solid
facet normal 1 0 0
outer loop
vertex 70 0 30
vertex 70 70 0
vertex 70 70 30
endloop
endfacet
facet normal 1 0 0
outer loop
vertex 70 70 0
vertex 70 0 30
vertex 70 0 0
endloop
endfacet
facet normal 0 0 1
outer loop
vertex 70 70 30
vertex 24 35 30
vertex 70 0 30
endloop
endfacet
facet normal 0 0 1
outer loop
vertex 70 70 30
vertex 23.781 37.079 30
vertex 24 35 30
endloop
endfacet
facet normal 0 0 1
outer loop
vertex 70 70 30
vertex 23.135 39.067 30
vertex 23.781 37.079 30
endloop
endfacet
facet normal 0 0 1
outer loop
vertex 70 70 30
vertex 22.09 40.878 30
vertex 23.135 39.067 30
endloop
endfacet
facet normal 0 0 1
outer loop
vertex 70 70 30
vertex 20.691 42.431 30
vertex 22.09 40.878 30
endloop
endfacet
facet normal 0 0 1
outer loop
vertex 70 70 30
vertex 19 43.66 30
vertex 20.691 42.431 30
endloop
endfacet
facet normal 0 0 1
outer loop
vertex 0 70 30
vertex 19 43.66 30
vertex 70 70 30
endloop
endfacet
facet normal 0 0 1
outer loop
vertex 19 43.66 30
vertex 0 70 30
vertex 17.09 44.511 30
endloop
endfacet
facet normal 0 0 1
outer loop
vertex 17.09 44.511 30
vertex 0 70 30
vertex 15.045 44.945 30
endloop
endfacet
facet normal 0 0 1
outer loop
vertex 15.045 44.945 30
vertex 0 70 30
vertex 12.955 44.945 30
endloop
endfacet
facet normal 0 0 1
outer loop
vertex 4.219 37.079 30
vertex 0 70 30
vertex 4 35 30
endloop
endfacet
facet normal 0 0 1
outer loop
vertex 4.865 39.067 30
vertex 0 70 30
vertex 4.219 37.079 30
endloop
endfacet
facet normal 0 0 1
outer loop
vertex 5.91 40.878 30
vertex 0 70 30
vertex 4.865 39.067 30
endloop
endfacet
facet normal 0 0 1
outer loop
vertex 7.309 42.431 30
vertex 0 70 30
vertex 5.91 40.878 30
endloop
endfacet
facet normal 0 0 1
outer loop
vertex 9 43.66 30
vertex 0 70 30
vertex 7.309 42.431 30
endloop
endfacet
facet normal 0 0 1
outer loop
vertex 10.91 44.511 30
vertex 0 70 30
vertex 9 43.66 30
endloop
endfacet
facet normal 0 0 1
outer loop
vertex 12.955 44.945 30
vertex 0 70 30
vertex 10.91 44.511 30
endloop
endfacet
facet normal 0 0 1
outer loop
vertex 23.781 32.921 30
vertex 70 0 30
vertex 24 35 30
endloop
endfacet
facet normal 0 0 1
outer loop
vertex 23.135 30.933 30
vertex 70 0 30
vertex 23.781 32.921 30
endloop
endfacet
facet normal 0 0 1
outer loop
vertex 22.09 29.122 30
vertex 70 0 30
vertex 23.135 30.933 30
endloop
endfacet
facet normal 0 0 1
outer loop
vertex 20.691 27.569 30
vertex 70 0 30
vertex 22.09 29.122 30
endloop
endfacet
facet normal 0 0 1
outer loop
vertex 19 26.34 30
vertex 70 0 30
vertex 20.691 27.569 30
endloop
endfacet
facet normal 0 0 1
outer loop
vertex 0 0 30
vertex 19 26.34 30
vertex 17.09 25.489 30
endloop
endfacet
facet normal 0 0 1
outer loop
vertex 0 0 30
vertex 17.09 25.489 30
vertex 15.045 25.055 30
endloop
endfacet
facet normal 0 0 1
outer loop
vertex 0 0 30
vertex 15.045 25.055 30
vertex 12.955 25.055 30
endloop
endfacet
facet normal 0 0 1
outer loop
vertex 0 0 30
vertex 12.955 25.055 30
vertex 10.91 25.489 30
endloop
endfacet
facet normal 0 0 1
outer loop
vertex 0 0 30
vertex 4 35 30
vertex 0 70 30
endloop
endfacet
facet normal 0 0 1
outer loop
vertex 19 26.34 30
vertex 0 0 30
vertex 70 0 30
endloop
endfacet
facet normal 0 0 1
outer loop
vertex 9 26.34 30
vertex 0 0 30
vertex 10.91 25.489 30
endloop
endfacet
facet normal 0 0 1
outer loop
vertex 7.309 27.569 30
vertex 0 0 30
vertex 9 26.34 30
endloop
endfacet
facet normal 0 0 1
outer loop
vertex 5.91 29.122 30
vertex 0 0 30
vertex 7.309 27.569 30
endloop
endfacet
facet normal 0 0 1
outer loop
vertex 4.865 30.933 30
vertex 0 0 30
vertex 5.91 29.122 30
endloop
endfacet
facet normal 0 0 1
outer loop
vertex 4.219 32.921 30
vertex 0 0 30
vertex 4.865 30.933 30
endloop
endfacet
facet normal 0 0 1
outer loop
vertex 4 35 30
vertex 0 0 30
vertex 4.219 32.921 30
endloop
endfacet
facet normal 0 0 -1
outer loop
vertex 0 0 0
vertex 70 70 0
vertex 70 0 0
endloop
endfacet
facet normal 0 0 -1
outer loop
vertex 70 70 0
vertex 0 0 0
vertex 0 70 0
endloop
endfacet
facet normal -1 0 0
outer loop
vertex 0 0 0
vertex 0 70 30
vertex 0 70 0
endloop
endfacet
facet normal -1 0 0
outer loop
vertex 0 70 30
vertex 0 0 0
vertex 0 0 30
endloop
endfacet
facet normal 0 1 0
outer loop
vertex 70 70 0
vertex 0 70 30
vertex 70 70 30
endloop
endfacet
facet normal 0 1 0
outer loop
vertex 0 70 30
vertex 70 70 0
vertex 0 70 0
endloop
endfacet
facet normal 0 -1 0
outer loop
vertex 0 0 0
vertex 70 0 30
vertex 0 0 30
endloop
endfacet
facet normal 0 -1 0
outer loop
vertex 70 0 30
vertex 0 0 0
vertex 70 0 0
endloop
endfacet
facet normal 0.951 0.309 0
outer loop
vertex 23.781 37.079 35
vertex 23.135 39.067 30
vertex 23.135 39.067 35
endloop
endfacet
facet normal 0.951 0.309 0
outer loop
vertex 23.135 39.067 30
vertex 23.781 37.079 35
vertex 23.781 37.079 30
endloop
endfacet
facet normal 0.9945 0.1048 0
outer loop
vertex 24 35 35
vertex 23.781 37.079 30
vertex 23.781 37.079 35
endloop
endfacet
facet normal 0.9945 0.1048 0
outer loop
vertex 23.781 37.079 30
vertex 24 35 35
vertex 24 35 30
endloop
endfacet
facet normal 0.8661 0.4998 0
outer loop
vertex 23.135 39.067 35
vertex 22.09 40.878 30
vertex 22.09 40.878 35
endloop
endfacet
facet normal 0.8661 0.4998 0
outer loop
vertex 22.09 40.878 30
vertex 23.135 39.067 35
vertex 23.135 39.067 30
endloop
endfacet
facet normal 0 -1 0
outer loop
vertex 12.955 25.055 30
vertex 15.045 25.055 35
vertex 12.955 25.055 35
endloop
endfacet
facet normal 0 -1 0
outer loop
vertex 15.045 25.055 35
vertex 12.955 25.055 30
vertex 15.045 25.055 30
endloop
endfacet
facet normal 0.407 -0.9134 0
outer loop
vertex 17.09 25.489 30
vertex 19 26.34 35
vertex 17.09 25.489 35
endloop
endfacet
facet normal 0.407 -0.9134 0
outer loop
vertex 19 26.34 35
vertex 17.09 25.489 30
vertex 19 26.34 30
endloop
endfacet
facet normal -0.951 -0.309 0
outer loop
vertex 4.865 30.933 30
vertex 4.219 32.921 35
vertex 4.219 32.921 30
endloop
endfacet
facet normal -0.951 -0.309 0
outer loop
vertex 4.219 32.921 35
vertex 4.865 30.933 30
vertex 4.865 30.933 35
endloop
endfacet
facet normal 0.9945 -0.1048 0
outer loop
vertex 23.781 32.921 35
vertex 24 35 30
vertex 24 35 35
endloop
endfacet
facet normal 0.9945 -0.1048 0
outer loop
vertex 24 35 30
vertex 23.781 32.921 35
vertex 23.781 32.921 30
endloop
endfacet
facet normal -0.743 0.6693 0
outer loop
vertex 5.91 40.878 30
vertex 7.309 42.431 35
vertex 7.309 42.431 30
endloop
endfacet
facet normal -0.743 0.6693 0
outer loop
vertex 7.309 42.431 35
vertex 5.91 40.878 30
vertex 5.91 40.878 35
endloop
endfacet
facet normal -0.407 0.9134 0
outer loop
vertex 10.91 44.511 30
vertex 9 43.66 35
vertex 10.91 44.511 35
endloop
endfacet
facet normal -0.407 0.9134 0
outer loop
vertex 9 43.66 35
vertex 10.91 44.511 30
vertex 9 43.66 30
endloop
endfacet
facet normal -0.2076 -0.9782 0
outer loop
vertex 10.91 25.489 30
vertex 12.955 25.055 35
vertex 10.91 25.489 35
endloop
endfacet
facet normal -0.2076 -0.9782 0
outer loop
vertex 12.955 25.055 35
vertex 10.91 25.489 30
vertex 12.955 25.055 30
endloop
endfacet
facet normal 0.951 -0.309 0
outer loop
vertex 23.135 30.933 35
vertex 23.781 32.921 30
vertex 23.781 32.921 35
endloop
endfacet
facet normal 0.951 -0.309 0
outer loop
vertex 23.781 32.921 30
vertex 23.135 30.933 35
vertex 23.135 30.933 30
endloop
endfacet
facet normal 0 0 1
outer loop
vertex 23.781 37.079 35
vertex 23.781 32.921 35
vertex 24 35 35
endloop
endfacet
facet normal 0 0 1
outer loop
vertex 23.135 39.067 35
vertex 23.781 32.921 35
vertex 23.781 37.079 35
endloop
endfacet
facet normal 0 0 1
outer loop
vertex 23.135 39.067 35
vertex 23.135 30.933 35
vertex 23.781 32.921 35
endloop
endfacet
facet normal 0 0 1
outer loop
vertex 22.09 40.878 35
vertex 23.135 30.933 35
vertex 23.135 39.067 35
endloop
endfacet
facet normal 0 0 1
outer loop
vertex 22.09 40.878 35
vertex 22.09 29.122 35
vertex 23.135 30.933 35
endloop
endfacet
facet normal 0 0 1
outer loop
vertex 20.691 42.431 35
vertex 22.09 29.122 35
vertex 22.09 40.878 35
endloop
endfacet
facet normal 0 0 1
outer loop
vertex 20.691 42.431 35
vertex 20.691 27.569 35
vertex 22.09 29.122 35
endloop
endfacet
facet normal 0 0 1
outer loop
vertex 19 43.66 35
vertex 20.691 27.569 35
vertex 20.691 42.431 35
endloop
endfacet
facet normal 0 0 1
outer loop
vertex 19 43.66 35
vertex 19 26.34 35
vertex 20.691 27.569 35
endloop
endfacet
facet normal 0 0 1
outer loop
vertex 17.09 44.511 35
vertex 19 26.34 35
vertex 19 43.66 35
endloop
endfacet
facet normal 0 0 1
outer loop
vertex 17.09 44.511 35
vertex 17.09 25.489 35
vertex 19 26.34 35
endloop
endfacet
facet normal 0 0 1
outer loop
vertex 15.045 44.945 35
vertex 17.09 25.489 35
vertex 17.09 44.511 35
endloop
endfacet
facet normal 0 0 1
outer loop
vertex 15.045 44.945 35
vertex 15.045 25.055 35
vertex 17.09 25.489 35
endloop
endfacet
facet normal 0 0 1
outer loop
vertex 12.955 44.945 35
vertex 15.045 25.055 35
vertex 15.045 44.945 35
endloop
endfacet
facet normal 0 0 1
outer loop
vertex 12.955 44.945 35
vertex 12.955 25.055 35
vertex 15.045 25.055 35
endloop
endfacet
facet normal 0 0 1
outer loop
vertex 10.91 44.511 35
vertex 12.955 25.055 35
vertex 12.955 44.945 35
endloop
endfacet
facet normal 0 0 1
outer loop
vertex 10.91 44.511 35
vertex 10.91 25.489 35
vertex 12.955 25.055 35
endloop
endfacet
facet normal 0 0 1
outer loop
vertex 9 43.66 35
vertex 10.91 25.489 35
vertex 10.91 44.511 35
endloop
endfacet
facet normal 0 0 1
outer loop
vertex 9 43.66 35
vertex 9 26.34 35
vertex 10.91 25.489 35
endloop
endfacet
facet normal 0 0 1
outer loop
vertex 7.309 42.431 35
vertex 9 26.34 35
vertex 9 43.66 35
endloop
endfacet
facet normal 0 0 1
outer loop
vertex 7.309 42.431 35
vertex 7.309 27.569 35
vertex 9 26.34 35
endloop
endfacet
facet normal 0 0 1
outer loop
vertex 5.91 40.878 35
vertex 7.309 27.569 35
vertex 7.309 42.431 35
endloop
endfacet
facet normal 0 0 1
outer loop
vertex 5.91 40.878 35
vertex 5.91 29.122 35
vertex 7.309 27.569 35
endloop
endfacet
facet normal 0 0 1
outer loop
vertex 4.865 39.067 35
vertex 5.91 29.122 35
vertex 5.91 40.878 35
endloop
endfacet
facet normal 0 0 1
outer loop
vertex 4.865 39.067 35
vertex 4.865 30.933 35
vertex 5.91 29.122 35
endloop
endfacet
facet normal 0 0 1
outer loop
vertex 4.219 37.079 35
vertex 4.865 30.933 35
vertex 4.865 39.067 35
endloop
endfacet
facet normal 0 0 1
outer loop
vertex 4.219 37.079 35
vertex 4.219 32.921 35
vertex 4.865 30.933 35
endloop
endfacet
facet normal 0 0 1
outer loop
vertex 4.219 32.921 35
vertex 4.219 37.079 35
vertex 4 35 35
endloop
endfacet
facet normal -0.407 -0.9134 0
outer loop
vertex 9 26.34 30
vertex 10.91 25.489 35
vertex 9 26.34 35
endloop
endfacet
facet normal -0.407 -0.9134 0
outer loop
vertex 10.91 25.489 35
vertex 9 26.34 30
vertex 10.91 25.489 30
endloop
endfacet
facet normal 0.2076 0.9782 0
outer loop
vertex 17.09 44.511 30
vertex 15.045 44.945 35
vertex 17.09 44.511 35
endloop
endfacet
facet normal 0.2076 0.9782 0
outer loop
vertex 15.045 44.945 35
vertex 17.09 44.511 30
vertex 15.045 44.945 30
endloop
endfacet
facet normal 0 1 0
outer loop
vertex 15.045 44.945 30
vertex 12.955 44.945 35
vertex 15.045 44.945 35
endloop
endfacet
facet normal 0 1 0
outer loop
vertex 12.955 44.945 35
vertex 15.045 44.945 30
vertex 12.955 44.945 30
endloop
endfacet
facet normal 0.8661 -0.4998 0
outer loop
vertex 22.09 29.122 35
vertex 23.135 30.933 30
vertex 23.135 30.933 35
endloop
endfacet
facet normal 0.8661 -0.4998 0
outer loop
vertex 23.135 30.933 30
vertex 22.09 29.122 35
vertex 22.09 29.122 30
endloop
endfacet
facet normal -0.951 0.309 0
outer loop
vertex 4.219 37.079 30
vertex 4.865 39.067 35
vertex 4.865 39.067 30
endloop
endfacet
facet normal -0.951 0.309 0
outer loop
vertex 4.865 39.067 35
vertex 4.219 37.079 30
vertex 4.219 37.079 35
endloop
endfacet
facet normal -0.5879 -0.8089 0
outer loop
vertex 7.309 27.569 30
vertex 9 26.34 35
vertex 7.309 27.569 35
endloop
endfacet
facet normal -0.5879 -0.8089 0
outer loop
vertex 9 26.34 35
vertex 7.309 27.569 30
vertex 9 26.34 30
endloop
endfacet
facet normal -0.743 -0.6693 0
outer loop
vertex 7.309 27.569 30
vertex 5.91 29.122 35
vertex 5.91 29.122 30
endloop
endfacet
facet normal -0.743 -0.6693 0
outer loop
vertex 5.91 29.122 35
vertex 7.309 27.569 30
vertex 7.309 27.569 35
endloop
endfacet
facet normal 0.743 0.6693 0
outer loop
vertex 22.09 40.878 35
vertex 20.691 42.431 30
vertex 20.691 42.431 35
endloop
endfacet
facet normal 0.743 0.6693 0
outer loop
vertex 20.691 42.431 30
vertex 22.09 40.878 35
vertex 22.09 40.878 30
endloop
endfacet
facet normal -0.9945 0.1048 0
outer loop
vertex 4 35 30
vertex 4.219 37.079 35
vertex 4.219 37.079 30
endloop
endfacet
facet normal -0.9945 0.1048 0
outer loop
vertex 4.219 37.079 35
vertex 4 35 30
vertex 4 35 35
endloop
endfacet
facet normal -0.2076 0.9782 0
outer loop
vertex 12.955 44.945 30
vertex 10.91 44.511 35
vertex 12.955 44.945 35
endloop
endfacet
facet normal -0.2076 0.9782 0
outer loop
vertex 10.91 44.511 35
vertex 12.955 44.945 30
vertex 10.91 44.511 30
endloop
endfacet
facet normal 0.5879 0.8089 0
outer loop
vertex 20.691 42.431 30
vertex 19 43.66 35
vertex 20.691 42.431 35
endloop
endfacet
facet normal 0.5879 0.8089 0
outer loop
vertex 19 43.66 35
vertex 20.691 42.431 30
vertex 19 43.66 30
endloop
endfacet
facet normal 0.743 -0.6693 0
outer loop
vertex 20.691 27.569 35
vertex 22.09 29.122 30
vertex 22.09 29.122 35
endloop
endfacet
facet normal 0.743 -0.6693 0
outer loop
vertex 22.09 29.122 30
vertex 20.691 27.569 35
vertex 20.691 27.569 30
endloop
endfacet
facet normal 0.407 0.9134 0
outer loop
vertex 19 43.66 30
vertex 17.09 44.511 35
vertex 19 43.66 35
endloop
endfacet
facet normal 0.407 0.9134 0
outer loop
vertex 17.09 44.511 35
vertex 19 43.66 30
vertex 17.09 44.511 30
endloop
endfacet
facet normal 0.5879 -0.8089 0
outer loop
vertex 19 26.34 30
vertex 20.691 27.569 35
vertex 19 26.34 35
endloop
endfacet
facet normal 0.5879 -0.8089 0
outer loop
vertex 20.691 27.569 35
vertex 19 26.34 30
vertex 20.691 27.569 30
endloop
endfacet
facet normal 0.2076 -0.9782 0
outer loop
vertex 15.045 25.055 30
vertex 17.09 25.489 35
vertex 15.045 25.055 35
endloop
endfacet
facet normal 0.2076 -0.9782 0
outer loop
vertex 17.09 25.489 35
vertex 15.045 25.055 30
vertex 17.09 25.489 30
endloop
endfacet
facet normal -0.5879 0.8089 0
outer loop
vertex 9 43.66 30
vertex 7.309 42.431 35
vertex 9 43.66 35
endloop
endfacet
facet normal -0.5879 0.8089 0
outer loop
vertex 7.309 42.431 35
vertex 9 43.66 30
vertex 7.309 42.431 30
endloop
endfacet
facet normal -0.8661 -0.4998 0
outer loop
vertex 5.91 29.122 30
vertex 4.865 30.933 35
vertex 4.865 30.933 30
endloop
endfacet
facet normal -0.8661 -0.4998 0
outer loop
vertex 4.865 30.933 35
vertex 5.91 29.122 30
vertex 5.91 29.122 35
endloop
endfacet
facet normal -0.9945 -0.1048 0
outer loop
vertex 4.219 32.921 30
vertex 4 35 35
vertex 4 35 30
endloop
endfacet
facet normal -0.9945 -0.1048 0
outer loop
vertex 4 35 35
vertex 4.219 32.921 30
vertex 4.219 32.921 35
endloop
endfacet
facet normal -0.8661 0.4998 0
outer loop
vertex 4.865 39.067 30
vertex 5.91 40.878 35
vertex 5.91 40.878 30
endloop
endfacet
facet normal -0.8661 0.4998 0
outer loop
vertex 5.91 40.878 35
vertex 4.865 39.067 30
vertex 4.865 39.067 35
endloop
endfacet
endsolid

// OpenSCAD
module tcore_powerbank() {
  cube([70,70,30]);
  translate([70 / 5, 70 / 2, 30]) {
    color([1,0,0])
    cylinder(h=5, r=10);
  }
}

tcore_powerbank();
